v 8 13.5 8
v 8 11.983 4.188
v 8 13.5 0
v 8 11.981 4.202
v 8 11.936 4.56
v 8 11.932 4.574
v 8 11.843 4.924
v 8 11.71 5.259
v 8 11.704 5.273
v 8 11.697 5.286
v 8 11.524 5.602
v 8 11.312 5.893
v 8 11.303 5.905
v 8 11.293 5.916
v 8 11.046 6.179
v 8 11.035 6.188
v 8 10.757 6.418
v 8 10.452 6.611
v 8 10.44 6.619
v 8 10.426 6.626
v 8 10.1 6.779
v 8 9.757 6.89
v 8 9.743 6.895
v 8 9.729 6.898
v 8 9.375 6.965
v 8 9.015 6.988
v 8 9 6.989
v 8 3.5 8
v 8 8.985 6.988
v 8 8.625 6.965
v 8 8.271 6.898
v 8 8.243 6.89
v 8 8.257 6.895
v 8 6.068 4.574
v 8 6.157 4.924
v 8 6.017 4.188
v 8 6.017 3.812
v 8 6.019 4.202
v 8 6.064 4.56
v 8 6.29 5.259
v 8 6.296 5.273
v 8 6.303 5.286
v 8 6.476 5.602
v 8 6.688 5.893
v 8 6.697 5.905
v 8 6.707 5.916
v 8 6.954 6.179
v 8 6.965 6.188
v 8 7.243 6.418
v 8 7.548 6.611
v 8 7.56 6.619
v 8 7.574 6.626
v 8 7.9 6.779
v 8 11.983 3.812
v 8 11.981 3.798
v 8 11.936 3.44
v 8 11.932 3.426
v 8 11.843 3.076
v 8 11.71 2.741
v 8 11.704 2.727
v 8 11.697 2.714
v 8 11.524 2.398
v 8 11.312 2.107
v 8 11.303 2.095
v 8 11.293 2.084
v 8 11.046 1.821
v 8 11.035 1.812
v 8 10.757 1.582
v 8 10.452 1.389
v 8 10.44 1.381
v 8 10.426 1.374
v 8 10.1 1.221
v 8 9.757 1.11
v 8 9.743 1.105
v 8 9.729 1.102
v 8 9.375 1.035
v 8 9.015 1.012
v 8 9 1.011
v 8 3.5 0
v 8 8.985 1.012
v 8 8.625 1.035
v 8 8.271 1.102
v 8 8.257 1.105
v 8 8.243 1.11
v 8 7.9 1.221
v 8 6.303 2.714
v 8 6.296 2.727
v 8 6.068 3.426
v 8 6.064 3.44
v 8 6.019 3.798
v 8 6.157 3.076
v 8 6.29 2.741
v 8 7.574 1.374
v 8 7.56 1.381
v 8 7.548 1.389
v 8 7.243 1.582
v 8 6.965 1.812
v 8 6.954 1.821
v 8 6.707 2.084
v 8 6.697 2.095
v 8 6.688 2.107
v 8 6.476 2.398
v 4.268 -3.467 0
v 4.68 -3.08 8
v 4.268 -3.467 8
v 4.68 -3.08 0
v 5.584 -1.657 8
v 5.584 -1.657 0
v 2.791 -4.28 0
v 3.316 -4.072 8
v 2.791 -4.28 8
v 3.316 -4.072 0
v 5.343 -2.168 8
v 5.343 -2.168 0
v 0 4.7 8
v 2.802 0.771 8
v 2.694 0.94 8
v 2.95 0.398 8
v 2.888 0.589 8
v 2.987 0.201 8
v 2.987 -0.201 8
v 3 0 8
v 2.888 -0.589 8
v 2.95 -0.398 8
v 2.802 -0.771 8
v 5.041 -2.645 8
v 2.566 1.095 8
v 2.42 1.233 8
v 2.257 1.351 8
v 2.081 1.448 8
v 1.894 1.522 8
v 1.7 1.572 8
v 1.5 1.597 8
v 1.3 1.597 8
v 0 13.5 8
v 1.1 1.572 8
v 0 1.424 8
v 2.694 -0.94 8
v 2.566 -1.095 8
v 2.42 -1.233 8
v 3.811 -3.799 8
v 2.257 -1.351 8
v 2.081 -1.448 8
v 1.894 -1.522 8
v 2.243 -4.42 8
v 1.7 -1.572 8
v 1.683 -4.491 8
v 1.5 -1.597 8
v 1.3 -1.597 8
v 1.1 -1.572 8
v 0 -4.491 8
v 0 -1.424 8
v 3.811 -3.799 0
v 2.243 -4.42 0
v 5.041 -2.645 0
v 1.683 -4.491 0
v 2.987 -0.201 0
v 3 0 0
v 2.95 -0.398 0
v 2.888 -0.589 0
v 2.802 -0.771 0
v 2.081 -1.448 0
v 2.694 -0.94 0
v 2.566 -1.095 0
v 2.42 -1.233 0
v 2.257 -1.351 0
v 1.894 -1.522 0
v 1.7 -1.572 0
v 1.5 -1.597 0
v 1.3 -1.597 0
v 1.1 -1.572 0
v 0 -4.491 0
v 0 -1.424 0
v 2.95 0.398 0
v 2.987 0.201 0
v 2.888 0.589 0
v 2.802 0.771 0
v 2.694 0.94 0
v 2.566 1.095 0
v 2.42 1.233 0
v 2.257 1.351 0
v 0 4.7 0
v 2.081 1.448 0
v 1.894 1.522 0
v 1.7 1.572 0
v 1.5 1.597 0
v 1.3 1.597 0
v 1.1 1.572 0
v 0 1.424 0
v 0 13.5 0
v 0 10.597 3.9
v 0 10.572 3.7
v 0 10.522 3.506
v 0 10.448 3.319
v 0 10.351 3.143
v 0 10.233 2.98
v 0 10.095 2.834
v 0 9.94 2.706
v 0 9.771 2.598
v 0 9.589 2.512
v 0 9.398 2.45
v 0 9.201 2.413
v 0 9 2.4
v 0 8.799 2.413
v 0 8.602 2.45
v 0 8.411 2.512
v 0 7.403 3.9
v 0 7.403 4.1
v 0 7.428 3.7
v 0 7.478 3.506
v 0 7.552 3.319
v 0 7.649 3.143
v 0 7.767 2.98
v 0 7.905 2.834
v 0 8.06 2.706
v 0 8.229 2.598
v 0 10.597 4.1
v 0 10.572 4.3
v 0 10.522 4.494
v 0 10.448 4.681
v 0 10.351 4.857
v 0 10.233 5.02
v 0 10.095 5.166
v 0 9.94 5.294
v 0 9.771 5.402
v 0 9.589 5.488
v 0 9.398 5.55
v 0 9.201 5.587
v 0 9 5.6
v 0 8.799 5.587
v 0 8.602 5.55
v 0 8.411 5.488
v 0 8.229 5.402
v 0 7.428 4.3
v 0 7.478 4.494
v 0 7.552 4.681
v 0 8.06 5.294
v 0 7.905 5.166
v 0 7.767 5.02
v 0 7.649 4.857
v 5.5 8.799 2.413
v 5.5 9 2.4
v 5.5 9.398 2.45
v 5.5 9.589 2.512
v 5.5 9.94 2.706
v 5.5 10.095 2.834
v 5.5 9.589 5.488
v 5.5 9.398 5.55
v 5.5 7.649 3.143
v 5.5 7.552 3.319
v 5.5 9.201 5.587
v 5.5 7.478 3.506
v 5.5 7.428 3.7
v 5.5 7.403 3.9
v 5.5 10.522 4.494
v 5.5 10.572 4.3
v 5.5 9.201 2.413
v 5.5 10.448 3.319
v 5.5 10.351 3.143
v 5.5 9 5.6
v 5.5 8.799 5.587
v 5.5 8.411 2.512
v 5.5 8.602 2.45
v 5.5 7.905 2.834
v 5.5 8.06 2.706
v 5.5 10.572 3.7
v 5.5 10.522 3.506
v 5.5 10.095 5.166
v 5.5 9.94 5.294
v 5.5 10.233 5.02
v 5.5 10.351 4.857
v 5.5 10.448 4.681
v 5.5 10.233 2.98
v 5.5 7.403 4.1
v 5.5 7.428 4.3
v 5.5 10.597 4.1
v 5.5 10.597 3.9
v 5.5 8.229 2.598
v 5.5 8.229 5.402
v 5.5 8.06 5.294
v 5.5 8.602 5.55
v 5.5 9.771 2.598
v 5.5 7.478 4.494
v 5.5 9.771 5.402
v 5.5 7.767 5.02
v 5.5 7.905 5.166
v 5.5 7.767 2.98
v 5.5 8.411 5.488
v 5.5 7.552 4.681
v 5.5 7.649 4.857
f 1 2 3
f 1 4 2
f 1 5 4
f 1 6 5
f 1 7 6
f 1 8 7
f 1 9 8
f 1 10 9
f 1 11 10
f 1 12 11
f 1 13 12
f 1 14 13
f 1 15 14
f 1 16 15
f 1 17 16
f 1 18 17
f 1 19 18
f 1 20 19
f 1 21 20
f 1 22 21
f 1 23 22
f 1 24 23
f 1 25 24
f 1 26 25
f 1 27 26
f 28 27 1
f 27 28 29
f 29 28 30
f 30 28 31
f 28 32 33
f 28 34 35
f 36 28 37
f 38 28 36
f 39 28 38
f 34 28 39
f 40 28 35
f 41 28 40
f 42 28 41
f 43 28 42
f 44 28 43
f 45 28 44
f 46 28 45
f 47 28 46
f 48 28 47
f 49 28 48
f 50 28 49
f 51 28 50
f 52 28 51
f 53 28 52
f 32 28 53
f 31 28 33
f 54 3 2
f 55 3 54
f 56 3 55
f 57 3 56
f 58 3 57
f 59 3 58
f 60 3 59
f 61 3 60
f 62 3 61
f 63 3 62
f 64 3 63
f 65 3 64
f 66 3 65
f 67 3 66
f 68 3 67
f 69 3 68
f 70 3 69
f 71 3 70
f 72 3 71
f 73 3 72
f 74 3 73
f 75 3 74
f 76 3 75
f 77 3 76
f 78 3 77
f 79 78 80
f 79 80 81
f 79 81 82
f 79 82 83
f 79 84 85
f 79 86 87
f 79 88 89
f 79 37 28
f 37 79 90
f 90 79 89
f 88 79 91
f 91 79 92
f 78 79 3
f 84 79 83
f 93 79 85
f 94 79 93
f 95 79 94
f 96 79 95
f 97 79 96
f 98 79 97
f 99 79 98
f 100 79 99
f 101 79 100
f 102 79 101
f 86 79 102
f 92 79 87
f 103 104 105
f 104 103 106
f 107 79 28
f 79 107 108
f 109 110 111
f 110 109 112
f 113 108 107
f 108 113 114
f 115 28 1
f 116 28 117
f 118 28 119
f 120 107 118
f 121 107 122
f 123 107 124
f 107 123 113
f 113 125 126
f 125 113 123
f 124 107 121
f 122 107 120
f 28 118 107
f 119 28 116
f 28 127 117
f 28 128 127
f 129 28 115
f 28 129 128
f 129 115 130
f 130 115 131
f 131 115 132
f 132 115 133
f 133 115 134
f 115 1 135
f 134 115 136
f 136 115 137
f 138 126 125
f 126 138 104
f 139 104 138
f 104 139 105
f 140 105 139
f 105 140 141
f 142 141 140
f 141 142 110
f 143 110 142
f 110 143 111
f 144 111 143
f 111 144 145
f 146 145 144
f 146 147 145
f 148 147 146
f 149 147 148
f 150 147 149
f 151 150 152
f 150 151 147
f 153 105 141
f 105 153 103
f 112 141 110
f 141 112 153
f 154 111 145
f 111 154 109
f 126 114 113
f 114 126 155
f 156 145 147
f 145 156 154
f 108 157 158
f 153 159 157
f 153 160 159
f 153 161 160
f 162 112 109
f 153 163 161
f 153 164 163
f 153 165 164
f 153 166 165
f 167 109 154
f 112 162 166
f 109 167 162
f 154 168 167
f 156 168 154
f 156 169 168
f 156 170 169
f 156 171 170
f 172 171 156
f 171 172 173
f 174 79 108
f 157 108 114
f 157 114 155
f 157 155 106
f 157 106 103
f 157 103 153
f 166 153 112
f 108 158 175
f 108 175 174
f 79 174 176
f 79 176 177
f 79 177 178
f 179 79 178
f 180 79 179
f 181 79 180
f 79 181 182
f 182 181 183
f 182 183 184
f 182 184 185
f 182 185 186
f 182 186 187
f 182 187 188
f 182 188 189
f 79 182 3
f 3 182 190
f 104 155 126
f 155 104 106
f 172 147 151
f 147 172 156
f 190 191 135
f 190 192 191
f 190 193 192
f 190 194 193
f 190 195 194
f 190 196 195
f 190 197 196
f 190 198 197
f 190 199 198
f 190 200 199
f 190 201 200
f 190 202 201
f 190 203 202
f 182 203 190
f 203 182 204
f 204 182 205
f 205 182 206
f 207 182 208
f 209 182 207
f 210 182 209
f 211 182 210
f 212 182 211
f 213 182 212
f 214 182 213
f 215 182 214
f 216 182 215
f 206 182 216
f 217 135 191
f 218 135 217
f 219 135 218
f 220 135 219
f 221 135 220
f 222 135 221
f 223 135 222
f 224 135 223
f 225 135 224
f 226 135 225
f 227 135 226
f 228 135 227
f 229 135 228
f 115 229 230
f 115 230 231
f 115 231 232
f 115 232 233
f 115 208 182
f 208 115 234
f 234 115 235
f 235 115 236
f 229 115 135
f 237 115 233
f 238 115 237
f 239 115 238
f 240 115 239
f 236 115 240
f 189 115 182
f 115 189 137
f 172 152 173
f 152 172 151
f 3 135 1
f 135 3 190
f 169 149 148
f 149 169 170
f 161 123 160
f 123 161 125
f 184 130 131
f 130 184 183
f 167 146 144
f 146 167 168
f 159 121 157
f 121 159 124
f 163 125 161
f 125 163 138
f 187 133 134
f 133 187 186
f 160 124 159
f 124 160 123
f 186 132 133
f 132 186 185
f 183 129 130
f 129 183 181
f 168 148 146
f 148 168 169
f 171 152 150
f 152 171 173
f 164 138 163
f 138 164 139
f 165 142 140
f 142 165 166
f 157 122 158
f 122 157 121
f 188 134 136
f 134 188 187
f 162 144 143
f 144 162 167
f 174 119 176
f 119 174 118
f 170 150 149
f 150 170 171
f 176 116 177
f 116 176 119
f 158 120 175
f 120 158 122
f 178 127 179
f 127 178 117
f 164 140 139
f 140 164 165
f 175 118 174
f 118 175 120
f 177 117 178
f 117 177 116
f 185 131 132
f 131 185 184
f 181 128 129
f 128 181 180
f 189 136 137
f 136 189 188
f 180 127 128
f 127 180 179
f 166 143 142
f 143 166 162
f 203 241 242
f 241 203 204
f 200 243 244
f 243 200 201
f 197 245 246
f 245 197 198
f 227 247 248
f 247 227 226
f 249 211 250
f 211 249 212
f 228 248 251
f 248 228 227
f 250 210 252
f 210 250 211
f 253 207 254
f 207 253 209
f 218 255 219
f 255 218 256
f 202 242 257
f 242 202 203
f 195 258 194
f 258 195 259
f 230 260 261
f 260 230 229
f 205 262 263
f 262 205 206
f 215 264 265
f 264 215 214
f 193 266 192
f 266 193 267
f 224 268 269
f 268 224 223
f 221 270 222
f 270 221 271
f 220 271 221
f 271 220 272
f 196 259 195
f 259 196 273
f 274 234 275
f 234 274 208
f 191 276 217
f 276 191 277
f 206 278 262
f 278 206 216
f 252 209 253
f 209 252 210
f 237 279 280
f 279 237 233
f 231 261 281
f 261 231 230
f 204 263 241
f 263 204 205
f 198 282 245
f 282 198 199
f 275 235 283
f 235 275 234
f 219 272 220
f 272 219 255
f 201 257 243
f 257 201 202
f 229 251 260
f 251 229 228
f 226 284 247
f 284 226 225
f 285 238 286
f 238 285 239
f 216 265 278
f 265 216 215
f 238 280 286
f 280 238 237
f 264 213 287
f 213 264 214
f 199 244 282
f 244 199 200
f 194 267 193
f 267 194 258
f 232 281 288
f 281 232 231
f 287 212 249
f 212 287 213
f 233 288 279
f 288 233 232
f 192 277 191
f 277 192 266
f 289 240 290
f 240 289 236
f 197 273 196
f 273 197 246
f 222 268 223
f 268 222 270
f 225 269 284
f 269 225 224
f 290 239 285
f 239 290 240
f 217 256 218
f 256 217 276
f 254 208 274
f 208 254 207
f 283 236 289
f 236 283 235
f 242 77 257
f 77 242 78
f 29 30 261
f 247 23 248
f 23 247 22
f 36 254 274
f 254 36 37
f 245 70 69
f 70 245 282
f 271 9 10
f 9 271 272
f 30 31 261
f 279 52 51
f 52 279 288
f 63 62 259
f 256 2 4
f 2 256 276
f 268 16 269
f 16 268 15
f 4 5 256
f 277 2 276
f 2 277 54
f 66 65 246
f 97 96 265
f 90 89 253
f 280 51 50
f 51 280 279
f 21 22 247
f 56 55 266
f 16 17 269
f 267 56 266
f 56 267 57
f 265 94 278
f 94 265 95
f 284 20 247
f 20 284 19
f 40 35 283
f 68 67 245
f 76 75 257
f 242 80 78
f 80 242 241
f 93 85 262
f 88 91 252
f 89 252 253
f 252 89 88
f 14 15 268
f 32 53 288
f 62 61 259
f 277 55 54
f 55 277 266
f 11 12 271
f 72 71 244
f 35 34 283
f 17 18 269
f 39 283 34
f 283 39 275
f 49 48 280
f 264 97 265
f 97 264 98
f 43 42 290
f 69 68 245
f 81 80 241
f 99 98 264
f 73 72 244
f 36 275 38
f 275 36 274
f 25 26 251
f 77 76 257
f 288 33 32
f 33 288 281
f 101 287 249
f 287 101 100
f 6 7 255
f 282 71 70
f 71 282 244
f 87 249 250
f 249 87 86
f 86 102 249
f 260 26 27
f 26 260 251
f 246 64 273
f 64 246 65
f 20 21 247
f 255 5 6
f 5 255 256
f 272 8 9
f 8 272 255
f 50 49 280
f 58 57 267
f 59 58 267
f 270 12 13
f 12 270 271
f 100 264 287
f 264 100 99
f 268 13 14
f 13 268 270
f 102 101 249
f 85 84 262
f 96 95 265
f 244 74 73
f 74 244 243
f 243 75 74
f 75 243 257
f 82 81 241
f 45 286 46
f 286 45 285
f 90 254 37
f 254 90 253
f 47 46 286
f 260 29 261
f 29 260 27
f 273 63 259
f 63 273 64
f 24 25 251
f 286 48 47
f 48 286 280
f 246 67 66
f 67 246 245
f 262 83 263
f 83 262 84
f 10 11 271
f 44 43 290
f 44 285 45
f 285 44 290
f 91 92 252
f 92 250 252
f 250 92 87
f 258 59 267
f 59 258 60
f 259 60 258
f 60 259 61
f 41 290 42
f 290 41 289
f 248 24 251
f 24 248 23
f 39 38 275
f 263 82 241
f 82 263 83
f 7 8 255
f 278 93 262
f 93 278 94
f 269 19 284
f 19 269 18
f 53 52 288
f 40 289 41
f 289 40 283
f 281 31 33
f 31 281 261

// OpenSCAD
// <Sopak's Cable Clamp> (c) by <Kamil Sopko>
// 
// <Sopak's Cable Clamp> is licensed under a
// Creative Commons Attribution-ShareAlike 4.0 Unported License.
// 
// You should have received a copy of the license along with this
// work.  If not, see <http://creativecommons.org/licenses/by-sa/4.0/>.

/* [Dimensions] */

//diameter of cable
cableDiameter=3; // [2:0.5:30]

//offset towards wall, controll how much presure will be on  cable
cablePressingOffset=0.1;// [0:0.5:10]

//how many cables
cableWideMultiplier=1;// [1:20]

//use cable separators?
cableSeparator="yes";      // [yes,no]

//min width of cable holder
width=3; // [3:30]

//height of clamp should  be at least size of 2*screwHoleDiameter
height=8; // [5:30]

//diameter of screw
screwHoleDiameter=3;    // [1:0.5:10]

//diameter of  scre head for countersung
screwHeadDiameter=6;    // [1:0.5:15]

//countersung screw height?
screwHeadHeight=2.5;    // [0:0.1:15]

//width of  part where is  screw,  it should be anything acording size of your screw and  material where it goes
widthOfScrewPart=8; // [3:30]

//one or double sided clamp
doubleSided="no";      // [yes,no]


/* [OtherValues] */

//number of leafes in cols
printCols=1;   // [1:5]
//number of leafes in rows
printRows=1;   // [1:5]
//spacing in print setup
printSpacing=3;   // [1:10]

//just  for cleaner boolean  operations
tolerance=0.2;

//quality
fn=50;

    
print();

module print(){
    
    //offset to create wide holder(more or flat cables)
    cableWideOffset=cableDiameter*(cableWideMultiplier-1);
    

    colSpace=cableDiameter+width;
    if(doubleSided=="yes"){
        rowSpace=(cableDiameter+6*width+2*tolerance+screwHoleDiameter*2)+cableWideOffset;
        printInternal(colSpace=colSpace,rowSpace=rowSpace);
        
        
    }else{
        rowSpace=(cableDiameter+4*width+2*tolerance+screwHoleDiameter)+cableWideOffset;
        printInternal(colSpace=colSpace,rowSpace=rowSpace);
    }
}

module printInternal(colSpace=30,rowSpace=30){

    for(row=[0:printRows-1]){
        for(col=[0:printCols-1]){

             translate([col*(colSpace+printSpacing),row*(rowSpace+printSpacing),0])cableClamp(
                cableDiameter=cableDiameter,
                cablePressingOffset=cablePressingOffset,
                cableWideMultiplier=cableWideMultiplier,
                cableSeparator=cableSeparator,
                width=width,
                height=height,
                screwHoleDiameter=screwHoleDiameter,
                screwHeadDiameter=screwHeadDiameter,
                screwHeadHeight=screwHeadHeight,
                widthOfScrewPart=widthOfScrewPart,
                doubleSided=doubleSided,
                tolerance=tolerance,
                $fn=fn
            );
        }
    }
}
module cableClamp(){
    
    //offset to create wide holder(more or flat cables)
    cableWideOffset=cableDiameter*(cableWideMultiplier-1);    

    
    difference(){
        union(){
            hull(){        
                translate([-cablePressingOffset,0,0])cylinder(d=cableDiameter+2*width,h=height);
                translate([cableDiameter/2-cablePressingOffset,0,0])cylinder(d=cableDiameter+2*width,h=height);            
                               
                //wide
                translate([-cablePressingOffset,cableWideOffset,0])cylinder(d=cableDiameter+2*width,h=height);
                translate([cableDiameter/2-cablePressingOffset,cableWideOffset,0]) cube([cableDiameter, cableDiameter, height]); //cylinder(d=cableDiameter+2*width,h=height);            
                
                //side joins
                translate([0,(cableDiameter+2*width)/2-1+cableWideOffset,0])cube([widthOfScrewPart,1,height]);
                if(doubleSided=="yes"){
                    translate([0,-(cableDiameter+2*width)/2,0])cube([widthOfScrewPart,1,height]);
                }
            }
            //sides
            translate([0,(cableDiameter+2*width)/2+cableWideOffset,0])cube([widthOfScrewPart,screwHoleDiameter+2*width,height]);
            if(doubleSided=="yes"){
                translate([0,-screwHoleDiameter-2*width-(cableDiameter+2*width)/2,0])cube([widthOfScrewPart,screwHoleDiameter+2*width,height]);
            }
            
        }
        //remove cable space
        
        if(cableSeparator=="yes"){
            for(i=[0:cableDiameter:cableWideOffset]){
            
                hull(){
                    translate([-cablePressingOffset,i,-tolerance])cylinder(d=cableDiameter-tolerance,h=height+2*tolerance);
                    translate([cableDiameter/2-cablePressingOffset,i,-tolerance])cylinder(d=cableDiameter+tolerance,h=height+2*tolerance);
                }
            }
            hull(){
                translate([-cablePressingOffset,0,-tolerance])cylinder(d=cableDiameter-tolerance,h=height+2*tolerance);            
                //wide
                translate([-cablePressingOffset,+cableWideOffset,-tolerance])cylinder(d=cableDiameter-tolerance,h=height+2*tolerance);
            }
        }else{
            hull(){
                translate([-cablePressingOffset,0,-tolerance])cylinder(d=cableDiameter-tolerance,h=height+2*tolerance);
                translate([cableDiameter/2-cablePressingOffset,0,-tolerance])cylinder(d=cableDiameter+tolerance,h=height+2*tolerance);
                
                //wide
                translate([-cablePressingOffset,+cableWideOffset,-tolerance])cylinder(d=cableDiameter-tolerance,h=height+2*tolerance);
                translate([cableDiameter/2-cablePressingOffset,+cableWideOffset,-tolerance])cylinder(d=cableDiameter+tolerance,h=height+2*tolerance);
            }
        }
        
        //remove screw holes
        translate([-tolerance,+screwHoleDiameter/2+width+(cableDiameter+2*width)/2+cableWideOffset,height/2])rotate([0,90,0])cylinder(d=screwHoleDiameter+tolerance,h=widthOfScrewPart+2*tolerance);        
        if(doubleSided=="yes"){
            translate([-tolerance,-screwHoleDiameter/2-width-(cableDiameter+2*width)/2,height/2])rotate([0,90,0])cylinder(d=screwHoleDiameter+tolerance,h=widthOfScrewPart+2*tolerance);
        }
        
        //remove countersung
        
        translate([widthOfScrewPart-screwHeadHeight,+screwHoleDiameter/2+width+(cableDiameter+2*width)/2+cableWideOffset,height/2])rotate([0,90,0])cylinder(d2=screwHeadDiameter+tolerance,d1=screwHoleDiameter+tolerance,h=screwHeadHeight+tolerance);        
        if(doubleSided=="yes"){
            translate([widthOfScrewPart-screwHeadHeight,-screwHoleDiameter/2-width-(cableDiameter+2*width)/2,height/2])rotate([0,90,0])cylinder(d2=screwHeadDiameter+tolerance,d1=screwHoleDiameter+tolerance,h=screwHeadHeight+tolerance);        
        }
        
        //remove all material under axe -X
        translate([-(cableDiameter+2*width),-(cableDiameter+2*width)/2-tolerance-screwHoleDiameter/2,-tolerance])cube([cableDiameter+2*width,(cableDiameter+2*width+2*tolerance+screwHoleDiameter/2)+cableWideOffset,height+2*tolerance]);   
    }
}
